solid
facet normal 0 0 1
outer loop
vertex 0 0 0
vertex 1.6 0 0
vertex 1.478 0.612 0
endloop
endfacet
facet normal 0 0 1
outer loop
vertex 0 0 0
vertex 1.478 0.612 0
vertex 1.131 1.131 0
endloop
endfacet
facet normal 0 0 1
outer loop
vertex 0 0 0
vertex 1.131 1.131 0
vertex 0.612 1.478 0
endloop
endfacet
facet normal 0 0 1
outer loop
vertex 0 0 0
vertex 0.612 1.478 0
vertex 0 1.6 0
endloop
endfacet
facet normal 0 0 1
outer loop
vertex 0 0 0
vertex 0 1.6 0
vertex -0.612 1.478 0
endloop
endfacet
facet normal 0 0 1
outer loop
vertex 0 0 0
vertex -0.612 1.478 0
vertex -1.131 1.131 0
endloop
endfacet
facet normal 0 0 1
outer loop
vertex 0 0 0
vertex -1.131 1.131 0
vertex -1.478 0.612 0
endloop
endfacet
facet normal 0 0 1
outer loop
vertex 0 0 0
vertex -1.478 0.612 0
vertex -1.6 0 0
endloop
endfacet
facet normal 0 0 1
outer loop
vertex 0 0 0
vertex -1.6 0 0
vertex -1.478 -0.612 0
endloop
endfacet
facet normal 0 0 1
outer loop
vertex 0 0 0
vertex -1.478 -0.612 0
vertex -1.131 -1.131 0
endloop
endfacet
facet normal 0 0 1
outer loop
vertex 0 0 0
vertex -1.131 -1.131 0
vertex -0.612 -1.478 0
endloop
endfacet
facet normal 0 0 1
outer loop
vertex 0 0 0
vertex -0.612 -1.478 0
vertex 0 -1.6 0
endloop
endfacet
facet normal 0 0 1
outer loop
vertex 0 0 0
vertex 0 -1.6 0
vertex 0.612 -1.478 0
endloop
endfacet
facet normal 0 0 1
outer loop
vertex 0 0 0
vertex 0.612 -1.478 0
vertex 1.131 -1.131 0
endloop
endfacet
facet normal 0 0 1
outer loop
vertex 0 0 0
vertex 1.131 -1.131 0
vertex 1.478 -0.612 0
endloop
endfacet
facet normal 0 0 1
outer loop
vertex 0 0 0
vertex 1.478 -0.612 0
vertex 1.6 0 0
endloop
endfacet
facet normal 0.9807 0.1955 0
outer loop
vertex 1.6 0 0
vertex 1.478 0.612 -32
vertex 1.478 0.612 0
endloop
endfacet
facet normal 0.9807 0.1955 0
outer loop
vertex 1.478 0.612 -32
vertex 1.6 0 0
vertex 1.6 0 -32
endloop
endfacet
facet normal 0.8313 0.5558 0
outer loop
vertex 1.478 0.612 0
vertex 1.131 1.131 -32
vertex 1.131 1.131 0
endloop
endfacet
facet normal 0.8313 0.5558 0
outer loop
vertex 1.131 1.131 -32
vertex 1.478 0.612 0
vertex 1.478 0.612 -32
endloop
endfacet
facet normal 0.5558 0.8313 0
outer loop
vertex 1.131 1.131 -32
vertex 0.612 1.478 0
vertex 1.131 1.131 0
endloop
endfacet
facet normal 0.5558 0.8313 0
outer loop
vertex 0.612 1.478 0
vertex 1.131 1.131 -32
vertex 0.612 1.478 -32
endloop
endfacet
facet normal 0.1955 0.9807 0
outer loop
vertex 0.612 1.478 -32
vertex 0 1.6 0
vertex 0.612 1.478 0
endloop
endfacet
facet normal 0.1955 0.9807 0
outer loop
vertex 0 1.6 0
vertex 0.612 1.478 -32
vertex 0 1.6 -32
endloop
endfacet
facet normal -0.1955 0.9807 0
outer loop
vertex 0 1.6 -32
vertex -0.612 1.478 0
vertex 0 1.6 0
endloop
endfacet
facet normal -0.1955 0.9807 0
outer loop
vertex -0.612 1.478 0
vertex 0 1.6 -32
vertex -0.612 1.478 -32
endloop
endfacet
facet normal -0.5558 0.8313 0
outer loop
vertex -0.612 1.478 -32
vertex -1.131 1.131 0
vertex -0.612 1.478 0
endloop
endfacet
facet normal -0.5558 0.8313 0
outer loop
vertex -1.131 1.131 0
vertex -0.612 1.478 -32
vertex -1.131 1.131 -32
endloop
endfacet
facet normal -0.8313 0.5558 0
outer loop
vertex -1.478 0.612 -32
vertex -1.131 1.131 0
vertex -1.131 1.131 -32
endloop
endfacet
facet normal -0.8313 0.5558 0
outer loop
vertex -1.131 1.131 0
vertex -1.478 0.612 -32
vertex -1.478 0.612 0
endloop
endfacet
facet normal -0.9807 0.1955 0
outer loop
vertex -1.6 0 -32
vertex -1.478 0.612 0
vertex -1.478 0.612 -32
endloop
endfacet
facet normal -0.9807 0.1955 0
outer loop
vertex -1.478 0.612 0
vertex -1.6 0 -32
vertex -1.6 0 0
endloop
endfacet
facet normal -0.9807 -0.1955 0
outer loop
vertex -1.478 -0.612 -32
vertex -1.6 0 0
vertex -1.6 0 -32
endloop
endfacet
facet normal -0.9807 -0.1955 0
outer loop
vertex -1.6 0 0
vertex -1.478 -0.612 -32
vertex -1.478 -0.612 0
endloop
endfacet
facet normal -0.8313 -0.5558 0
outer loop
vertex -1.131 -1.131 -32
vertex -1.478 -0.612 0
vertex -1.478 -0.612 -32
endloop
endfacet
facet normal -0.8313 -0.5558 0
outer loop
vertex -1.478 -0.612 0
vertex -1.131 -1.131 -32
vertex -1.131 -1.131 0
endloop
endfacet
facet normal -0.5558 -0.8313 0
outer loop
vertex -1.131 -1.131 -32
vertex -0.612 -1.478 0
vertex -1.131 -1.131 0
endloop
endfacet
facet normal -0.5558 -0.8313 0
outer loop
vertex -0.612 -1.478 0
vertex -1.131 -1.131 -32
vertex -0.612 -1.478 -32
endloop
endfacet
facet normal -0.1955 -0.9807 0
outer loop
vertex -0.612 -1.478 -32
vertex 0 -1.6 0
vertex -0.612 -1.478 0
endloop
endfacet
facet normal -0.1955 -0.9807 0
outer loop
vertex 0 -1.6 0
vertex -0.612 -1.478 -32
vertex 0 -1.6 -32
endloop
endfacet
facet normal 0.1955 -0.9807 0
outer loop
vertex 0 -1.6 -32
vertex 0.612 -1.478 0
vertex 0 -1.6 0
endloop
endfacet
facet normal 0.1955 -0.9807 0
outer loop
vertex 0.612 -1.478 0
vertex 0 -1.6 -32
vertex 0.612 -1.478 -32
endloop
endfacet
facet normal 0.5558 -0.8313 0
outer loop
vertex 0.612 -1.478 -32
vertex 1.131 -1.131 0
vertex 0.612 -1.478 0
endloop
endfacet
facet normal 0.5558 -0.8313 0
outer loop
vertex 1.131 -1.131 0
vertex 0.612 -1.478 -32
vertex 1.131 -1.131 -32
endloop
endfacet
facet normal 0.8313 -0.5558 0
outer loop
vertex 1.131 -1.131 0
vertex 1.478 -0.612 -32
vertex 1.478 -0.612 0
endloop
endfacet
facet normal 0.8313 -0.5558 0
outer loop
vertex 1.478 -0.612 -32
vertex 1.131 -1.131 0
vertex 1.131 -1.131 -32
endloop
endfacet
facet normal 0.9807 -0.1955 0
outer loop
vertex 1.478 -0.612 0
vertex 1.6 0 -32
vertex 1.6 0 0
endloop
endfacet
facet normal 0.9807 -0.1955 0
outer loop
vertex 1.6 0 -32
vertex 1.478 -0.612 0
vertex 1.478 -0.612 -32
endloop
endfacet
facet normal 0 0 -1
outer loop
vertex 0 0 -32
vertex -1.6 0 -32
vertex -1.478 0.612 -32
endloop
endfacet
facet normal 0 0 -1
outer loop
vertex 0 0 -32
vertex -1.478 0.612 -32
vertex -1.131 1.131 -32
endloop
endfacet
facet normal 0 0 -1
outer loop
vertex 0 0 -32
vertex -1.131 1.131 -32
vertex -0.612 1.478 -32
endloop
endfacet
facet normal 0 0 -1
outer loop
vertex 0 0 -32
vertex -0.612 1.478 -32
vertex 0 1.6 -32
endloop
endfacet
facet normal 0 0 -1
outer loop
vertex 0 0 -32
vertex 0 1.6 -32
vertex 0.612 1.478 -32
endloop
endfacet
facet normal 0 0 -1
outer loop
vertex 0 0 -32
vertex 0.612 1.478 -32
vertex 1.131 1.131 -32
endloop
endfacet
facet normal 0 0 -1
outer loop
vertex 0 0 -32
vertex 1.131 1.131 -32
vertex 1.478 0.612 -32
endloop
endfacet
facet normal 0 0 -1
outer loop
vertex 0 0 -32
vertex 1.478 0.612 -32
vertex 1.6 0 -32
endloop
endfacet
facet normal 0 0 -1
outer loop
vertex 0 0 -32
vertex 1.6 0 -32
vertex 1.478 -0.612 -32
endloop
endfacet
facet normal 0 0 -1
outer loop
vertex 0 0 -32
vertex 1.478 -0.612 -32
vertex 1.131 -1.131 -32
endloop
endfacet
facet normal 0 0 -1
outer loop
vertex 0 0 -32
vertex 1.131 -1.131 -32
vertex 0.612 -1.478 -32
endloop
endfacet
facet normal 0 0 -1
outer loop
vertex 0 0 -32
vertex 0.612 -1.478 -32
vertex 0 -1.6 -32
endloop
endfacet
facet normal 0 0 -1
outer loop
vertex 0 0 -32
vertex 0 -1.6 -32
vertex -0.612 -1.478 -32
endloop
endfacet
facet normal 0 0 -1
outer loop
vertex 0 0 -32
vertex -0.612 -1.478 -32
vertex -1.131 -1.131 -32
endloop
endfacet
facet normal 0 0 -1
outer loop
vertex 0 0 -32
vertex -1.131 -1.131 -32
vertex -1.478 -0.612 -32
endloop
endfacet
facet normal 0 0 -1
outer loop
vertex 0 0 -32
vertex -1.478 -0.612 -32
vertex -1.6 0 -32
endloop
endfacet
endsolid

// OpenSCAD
// file: ../p/4-4edge.scad
use <../lib.scad>
function ldraw_lib__4_4edge() = [
// 0 Circle 1.0
// 0 Name: 4-4edge.dat
// 0 Author: James Jessiman
// 0 !LDRAW_ORG Primitive UPDATE 2017-01
// 0 !LICENSE Licensed under CC BY 2.0 and CC BY 4.0 : see CAreadme.txt
// 
// 0 BFC CERTIFY CCW
  [0,"BFC","CERTIFY"],
  [0,"BFC","CCW"],
// 
// 0 !HISTORY 1998-12-15 [PTadmin] Official Update 1998-10
// 0 !HISTORY 2005-12-28 [PTadmin] Official Update 2005-01
// 0 !HISTORY 2007-06-24 [PTadmin] Header formatted for Contributor Agreement
// 0 !HISTORY 2008-07-01 [PTadmin] Official Update 2008-01
// 0 !HISTORY 2017-01-15 [Steffen] BFCed
// 0 !HISTORY 2017-12-30 [PTadmin] Official Update 2017-01
// 
// 
// 2 24 1 0 0 0.9239 0 0.3827
  [2,24,1,0,0,0.9239,0,0.3827],
// 2 24 0.9239 0 0.3827 0.7071 0 0.7071
  [2,24,0.9239,0,0.3827,0.7071,0,0.7071],
// 2 24 0.7071 0 0.7071 0.3827 0 0.9239
  [2,24,0.7071,0,0.7071,0.3827,0,0.9239],
// 2 24 0.3827 0 0.9239 0 0 1
  [2,24,0.3827,0,0.9239,0,0,1],
// 2 24 0 0 1 -0.3827 0 0.9239
  [2,24,0,0,1,-0.3827,0,0.9239],
// 2 24 -0.3827 0 0.9239 -0.7071 0 0.7071
  [2,24,-0.3827,0,0.9239,-0.7071,0,0.7071],
// 2 24 -0.7071 0 0.7071 -0.9239 0 0.3827
  [2,24,-0.7071,0,0.7071,-0.9239,0,0.3827],
// 2 24 -0.9239 0 0.3827 -1 0 -0
  [2,24,-0.9239,0,0.3827,-1,0,-0],
// 2 24 -1 0 -0 -0.9239 0 -0.3827
  [2,24,-1,0,-0,-0.9239,0,-0.3827],
// 2 24 -0.9239 0 -0.3827 -0.7071 0 -0.7071
  [2,24,-0.9239,0,-0.3827,-0.7071,0,-0.7071],
// 2 24 -0.7071 0 -0.7071 -0.3827 0 -0.9239
  [2,24,-0.7071,0,-0.7071,-0.3827,0,-0.9239],
// 2 24 -0.3827 0 -0.9239 0 0 -1
  [2,24,-0.3827,0,-0.9239,0,0,-1],
// 2 24 0 0 -1 0.3827 0 -0.9239
  [2,24,0,0,-1,0.3827,0,-0.9239],
// 2 24 0.3827 0 -0.9239 0.7071 0 -0.7071
  [2,24,0.3827,0,-0.9239,0.7071,0,-0.7071],
// 2 24 0.7071 0 -0.7071 0.9239 0 -0.3827
  [2,24,0.7071,0,-0.7071,0.9239,0,-0.3827],
// 2 24 0.9239 0 -0.3827 1 0 0
  [2,24,0.9239,0,-0.3827,1,0,0],
];
makepoly(ldraw_lib__4_4edge(), line=0.2);
// file: ../p/4-4disc.scad
use <../lib.scad>
function ldraw_lib__4_4disc() = [
// 0 Disc 1.0
// 0 Name: 4-4disc.dat
// 0 Author: James Jessiman
// 0 !LDRAW_ORG Primitive UPDATE 2002-02
// 0 !LICENSE Licensed under CC BY 2.0 and CC BY 4.0 : see CAreadme.txt
// 
// 0 BFC CERTIFY CCW
  [0,"BFC","CERTIFY"],
  [0,"BFC","CCW"],
// 
// 0 !HISTORY 1998-12-15 [PTadmin] Official Update 1998-10
// 0 !HISTORY 2002-03-23 [sbliss] Added BFC statement
// 0 !HISTORY 2002-04-25 [PTadmin] Official Update 2002-02
// 0 !HISTORY 2007-06-24 [PTadmin] Header formatted for Contributor Agreement
// 0 !HISTORY 2008-07-01 [PTadmin] Official Update 2008-01
// 
// 
// 3 16 0 0 0 1 0 0 0.9239 0 0.3827
  [3,16,0,0,0,1,0,0,0.9239,0,0.3827],
// 3 16 0 0 0 0.9239 0 0.3827 0.7071 0 0.7071
  [3,16,0,0,0,0.9239,0,0.3827,0.7071,0,0.7071],
// 3 16 0 0 0 0.7071 0 0.7071 0.3827 0 0.9239
  [3,16,0,0,0,0.7071,0,0.7071,0.3827,0,0.9239],
// 3 16 0 0 0 0.3827 0 0.9239 0 0 1
  [3,16,0,0,0,0.3827,0,0.9239,0,0,1],
// 3 16 0 0 0 0 0 1 -0.3827 0 0.9239
  [3,16,0,0,0,0,0,1,-0.3827,0,0.9239],
// 3 16 0 0 0 -0.3827 0 0.9239 -0.7071 0 0.7071
  [3,16,0,0,0,-0.3827,0,0.9239,-0.7071,0,0.7071],
// 3 16 0 0 0 -0.7071 0 0.7071 -0.9239 0 0.3827
  [3,16,0,0,0,-0.7071,0,0.7071,-0.9239,0,0.3827],
// 3 16 0 0 0 -0.9239 0 0.3827 -1 0 -0
  [3,16,0,0,0,-0.9239,0,0.3827,-1,0,-0],
// 3 16 0 0 0 -1 0 -0 -0.9239 0 -0.3827
  [3,16,0,0,0,-1,0,-0,-0.9239,0,-0.3827],
// 3 16 0 0 0 -0.9239 0 -0.3827 -0.7071 0 -0.7071
  [3,16,0,0,0,-0.9239,0,-0.3827,-0.7071,0,-0.7071],
// 3 16 0 0 0 -0.7071 0 -0.7071 -0.3827 0 -0.9239
  [3,16,0,0,0,-0.7071,0,-0.7071,-0.3827,0,-0.9239],
// 3 16 0 0 0 -0.3827 0 -0.9239 0 0 -1
  [3,16,0,0,0,-0.3827,0,-0.9239,0,0,-1],
// 3 16 0 0 0 0 0 -1 0.3827 0 -0.9239
  [3,16,0,0,0,0,0,-1,0.3827,0,-0.9239],
// 3 16 0 0 0 0.3827 0 -0.9239 0.7071 0 -0.7071
  [3,16,0,0,0,0.3827,0,-0.9239,0.7071,0,-0.7071],
// 3 16 0 0 0 0.7071 0 -0.7071 0.9239 0 -0.3827
  [3,16,0,0,0,0.7071,0,-0.7071,0.9239,0,-0.3827],
// 3 16 0 0 0 0.9239 0 -0.3827 1 0 0
  [3,16,0,0,0,0.9239,0,-0.3827,1,0,0],
// 0
];
makepoly(ldraw_lib__4_4disc(), line=0.2);
// file: ../p/4-4cyli.scad
use <../lib.scad>
function ldraw_lib__4_4cyli() = [
// 0 Cylinder 1.0
// 0 Name: 4-4cyli.dat
// 0 Author: James Jessiman
// 0 !LDRAW_ORG Primitive UPDATE 2005-01
// 0 !LICENSE Licensed under CC BY 2.0 and CC BY 4.0 : see CAreadme.txt
// 
// 0 BFC CERTIFY CCW
  [0,"BFC","CERTIFY"],
  [0,"BFC","CCW"],
// 
// 0 !HISTORY 1998-12-15 [PTadmin] Official Update 1998-10
// 0 !HISTORY 2002-03-23 [sbliss] Added BFC statement; merged headers from files in distributions LDraw 0.27 and Complete.
// 0 !HISTORY 2002-04-25 [PTadmin] Official Update 2002-02
// 0 !HISTORY 2004-12-14 [guyvivan] BFC CCW
// 0 !HISTORY 2005-12-28 [PTadmin] Official Update 2005-01
// 0 !HISTORY 2007-06-24 [PTadmin] Header formatted for Contributor Agreement
// 0 !HISTORY 2008-07-01 [PTadmin] Official Update 2008-01
// 
// 
// 4 16 1 1 0 0.9239 1 0.3827 0.9239 0 0.3827 1 0 0
  [4,16,1,1,0,0.9239,1,0.3827,0.9239,0,0.3827,1,0,0],
// 5 24 1 0 0 1 1 0 0.9239 0 0.3827 0.9239 0 -0.3827
  [5,24,1,0,0,1,1,0,0.9239,0,0.3827,0.9239,0,-0.3827],
// 4 16 0.9239 1 0.3827 0.7071 1 0.7071 0.7071 0 0.7071 0.9239 0 0.3827
  [4,16,0.9239,1,0.3827,0.7071,1,0.7071,0.7071,0,0.7071,0.9239,0,0.3827],
// 5 24 0.9239 0 0.3827 0.9239 1 0.3827 0.7071 0 0.7071 1 0 0
  [5,24,0.9239,0,0.3827,0.9239,1,0.3827,0.7071,0,0.7071,1,0,0],
// 4 16 0.7071 1 0.7071 0.3827 1 0.9239 0.3827 0 0.9239 0.7071 0 0.7071
  [4,16,0.7071,1,0.7071,0.3827,1,0.9239,0.3827,0,0.9239,0.7071,0,0.7071],
// 5 24 0.7071 0 0.7071 0.7071 1 0.7071 0.3827 0 0.9239 0.9239 0 0.3827
  [5,24,0.7071,0,0.7071,0.7071,1,0.7071,0.3827,0,0.9239,0.9239,0,0.3827],
// 4 16 0.3827 1 0.9239 0 1 1 0 0 1 0.3827 0 0.9239
  [4,16,0.3827,1,0.9239,0,1,1,0,0,1,0.3827,0,0.9239],
// 5 24 0.3827 0 0.9239 0.3827 1 0.9239 0 0 1 0.7071 0 0.7071
  [5,24,0.3827,0,0.9239,0.3827,1,0.9239,0,0,1,0.7071,0,0.7071],
// 4 16 0 1 1 -0.3827 1 0.9239 -0.3827 0 0.9239 0 0 1
  [4,16,0,1,1,-0.3827,1,0.9239,-0.3827,0,0.9239,0,0,1],
// 5 24 0 0 1 0 1 1 -0.3827 0 0.9239 0.3827 0 0.9239
  [5,24,0,0,1,0,1,1,-0.3827,0,0.9239,0.3827,0,0.9239],
// 4 16 -0.3827 1 0.9239 -0.7071 1 0.7071 -0.7071 0 0.7071 -0.3827 0 0.9239
  [4,16,-0.3827,1,0.9239,-0.7071,1,0.7071,-0.7071,0,0.7071,-0.3827,0,0.9239],
// 5 24 -0.3827 0 0.9239 -0.3827 1 0.9239 -0.7071 0 0.7071 0 0 1
  [5,24,-0.3827,0,0.9239,-0.3827,1,0.9239,-0.7071,0,0.7071,0,0,1],
// 4 16 -0.7071 1 0.7071 -0.9239 1 0.3827 -0.9239 0 0.3827 -0.7071 0 0.7071
  [4,16,-0.7071,1,0.7071,-0.9239,1,0.3827,-0.9239,0,0.3827,-0.7071,0,0.7071],
// 5 24 -0.7071 0 0.7071 -0.7071 1 0.7071 -0.9239 0 0.3827 -0.3827 0 0.9239
  [5,24,-0.7071,0,0.7071,-0.7071,1,0.7071,-0.9239,0,0.3827,-0.3827,0,0.9239],
// 4 16 -0.9239 1 0.3827 -1 1 0 -1 0 0 -0.9239 0 0.3827
  [4,16,-0.9239,1,0.3827,-1,1,0,-1,0,0,-0.9239,0,0.3827],
// 5 24 -0.9239 0 0.3827 -0.9239 1 0.3827 -1 0 0 -0.7071 0 0.7071
  [5,24,-0.9239,0,0.3827,-0.9239,1,0.3827,-1,0,0,-0.7071,0,0.7071],
// 4 16 -1 1 0 -0.9239 1 -0.3827 -0.9239 0 -0.3827 -1 0 0
  [4,16,-1,1,0,-0.9239,1,-0.3827,-0.9239,0,-0.3827,-1,0,0],
// 5 24 -1 0 0 -1 1 0 -0.9239 0 -0.3827 -0.9239 0 0.3827
  [5,24,-1,0,0,-1,1,0,-0.9239,0,-0.3827,-0.9239,0,0.3827],
// 4 16 -0.9239 1 -0.3827 -0.7071 1 -0.7071 -0.7071 0 -0.7071 -0.9239 0 -0.3827
  [4,16,-0.9239,1,-0.3827,-0.7071,1,-0.7071,-0.7071,0,-0.7071,-0.9239,0,-0.3827],
// 5 24 -0.9239 0 -0.3827 -0.9239 1 -0.3827 -0.7071 0 -0.7071 -1 0 0
  [5,24,-0.9239,0,-0.3827,-0.9239,1,-0.3827,-0.7071,0,-0.7071,-1,0,0],
// 4 16 -0.7071 1 -0.7071 -0.3827 1 -0.9239 -0.3827 0 -0.9239 -0.7071 0 -0.7071
  [4,16,-0.7071,1,-0.7071,-0.3827,1,-0.9239,-0.3827,0,-0.9239,-0.7071,0,-0.7071],
// 5 24 -0.7071 0 -0.7071 -0.7071 1 -0.7071 -0.3827 0 -0.9239 -0.9239 0 -0.3827
  [5,24,-0.7071,0,-0.7071,-0.7071,1,-0.7071,-0.3827,0,-0.9239,-0.9239,0,-0.3827],
// 4 16 -0.3827 1 -0.9239 0 1 -1 0 0 -1 -0.3827 0 -0.9239
  [4,16,-0.3827,1,-0.9239,0,1,-1,0,0,-1,-0.3827,0,-0.9239],
// 5 24 -0.3827 0 -0.9239 -0.3827 1 -0.9239 0 0 -1 -0.7071 0 -0.7071
  [5,24,-0.3827,0,-0.9239,-0.3827,1,-0.9239,0,0,-1,-0.7071,0,-0.7071],
// 4 16 0 1 -1 0.3827 1 -0.9239 0.3827 0 -0.9239 0 0 -1
  [4,16,0,1,-1,0.3827,1,-0.9239,0.3827,0,-0.9239,0,0,-1],
// 5 24 0 0 -1 0 1 -1 0.3827 0 -0.9239 -0.3827 0 -0.9239
  [5,24,0,0,-1,0,1,-1,0.3827,0,-0.9239,-0.3827,0,-0.9239],
// 4 16 0.3827 1 -0.9239 0.7071 1 -0.7071 0.7071 0 -0.7071 0.3827 0 -0.9239
  [4,16,0.3827,1,-0.9239,0.7071,1,-0.7071,0.7071,0,-0.7071,0.3827,0,-0.9239],
// 5 24 0.3827 0 -0.9239 0.3827 1 -0.9239 0.7071 0 -0.7071 0 0 -1
  [5,24,0.3827,0,-0.9239,0.3827,1,-0.9239,0.7071,0,-0.7071,0,0,-1],
// 4 16 0.7071 1 -0.7071 0.9239 1 -0.3827 0.9239 0 -0.3827 0.7071 0 -0.7071
  [4,16,0.7071,1,-0.7071,0.9239,1,-0.3827,0.9239,0,-0.3827,0.7071,0,-0.7071],
// 5 24 0.7071 0 -0.7071 0.7071 1 -0.7071 0.9239 0 -0.3827 0.3827 0 -0.9239
  [5,24,0.7071,0,-0.7071,0.7071,1,-0.7071,0.9239,0,-0.3827,0.3827,0,-0.9239],
// 4 16 0.9239 1 -0.3827 1 1 0 1 0 0 0.9239 0 -0.3827
  [4,16,0.9239,1,-0.3827,1,1,0,1,0,0,0.9239,0,-0.3827],
// 5 24 0.9239 0 -0.3827 0.9239 1 -0.3827 1 0 0 0.7071 0 -0.7071
  [5,24,0.9239,0,-0.3827,0.9239,1,-0.3827,1,0,0,0.7071,0,-0.7071],
// 0
];
makepoly(ldraw_lib__4_4cyli(), line=0.2);
// file: 30374.scad
use <../lib.scad>
use <../p/4-4cyli.scad>
use <../p/4-4disc.scad>
use <../p/4-4edge.scad>
function ldraw_lib__30374() = [
// 0 Bar  4L Lightsaber Blade
// 0 Name: 30374.dat
// 0 Author: Steve Bliss [sbliss]
// 0 !LDRAW_ORG Part UPDATE 2018-01
// 0 !LICENSE Licensed under CC BY 2.0 and CC BY 4.0 : see CAreadme.txt
// 
// 0 BFC CERTIFY CW
  [0,"BFC","CERTIFY"],
  [0,"BFC","CW"],
// 
// 0 !KEYWORDS bar, minifig accessory, saber, Star Wars, tool
// 
// 0 !HISTORY 2002-07-26 [sbliss] Corrected spacing in title, applied BFC
// 0 !HISTORY 2003-08-01 [PTadmin] Official Update 2003-02
// 0 !HISTORY 2007-06-07 [PTadmin] Header formatted for Contributor Agreement
// 0 !HISTORY 2008-07-01 [PTadmin] Official Update 2008-01
// 0 !HISTORY 2017-12-31 [cwdee] Correct lightsaber spelling
// 0 !HISTORY 2018-01-30 [PTadmin] Official Update 2018-01
// 
// 
// 1 16 0 0 0 4 0 0 0 1 0 0 0 4 4-4edge.dat
  [1,16,0,0,0,4,0,0,0,1,0,0,0,4, ldraw_lib__4_4edge()],
// 1 16 0 80 0 4 0 0 0 1 0 0 0 4 4-4edge.dat
  [1,16,0,80,0,4,0,0,0,1,0,0,0,4, ldraw_lib__4_4edge()],
// 1 16 0 0 0 4 0 0 0 1 0 0 0 4 4-4disc.dat
  [1,16,0,0,0,4,0,0,0,1,0,0,0,4, ldraw_lib__4_4disc()],
// 1 16 0 0 0 4 0 0 0 80 0 0 0 4 4-4cyli.dat
  [1,16,0,0,0,4,0,0,0,80,0,0,0,4, ldraw_lib__4_4cyli()],
// 1 16 0 80 0 -4 0 0 0 -1 0 0 0 4 4-4disc.dat
  [1,16,0,80,0,-4,0,0,0,-1,0,0,0,4, ldraw_lib__4_4disc()],
// 0
];
makepoly(ldraw_lib__30374(), line=0.2);
// main file
use <../lib.scad>
use <30374.scad>
function ldraw_lib__578() = [
// 0 ~Moved to 30374
// 0 Name: 578.dat
// 0 Author: [PTadmin]
// 0 !LDRAW_ORG Part UPDATE 2003-02
// 0 !LICENSE Licensed under CC BY 4.0 : see CAreadme.txt
// 
// 0 BFC CERTIFY CCW
  [0,"BFC","CERTIFY"],
  [0,"BFC","CCW"],
// 
// 0 !HISTORY 1999-05-24 [PTadmin] Official Update 1999-04
// 0 !HISTORY 2002-11-30 [PTadmin] Official Update 2002-05
// 0 !HISTORY 2003-08-01 [PTadmin] Official Update 2003-02
// 0 !HISTORY 2007-07-09 [PTadmin] Header formatted for Contributor Agreement
// 0 !HISTORY 2008-07-01 [PTadmin] Official Update 2008-01
// 
// 
// 1 16 0 0 0 1 0 0 0 1 0 0 0 1 30374.dat
  [1,16,0,0,0,1,0,0,0,1,0,0,0,1, ldraw_lib__30374()],
];
makepoly(ldraw_lib__578(), line=0.2);
